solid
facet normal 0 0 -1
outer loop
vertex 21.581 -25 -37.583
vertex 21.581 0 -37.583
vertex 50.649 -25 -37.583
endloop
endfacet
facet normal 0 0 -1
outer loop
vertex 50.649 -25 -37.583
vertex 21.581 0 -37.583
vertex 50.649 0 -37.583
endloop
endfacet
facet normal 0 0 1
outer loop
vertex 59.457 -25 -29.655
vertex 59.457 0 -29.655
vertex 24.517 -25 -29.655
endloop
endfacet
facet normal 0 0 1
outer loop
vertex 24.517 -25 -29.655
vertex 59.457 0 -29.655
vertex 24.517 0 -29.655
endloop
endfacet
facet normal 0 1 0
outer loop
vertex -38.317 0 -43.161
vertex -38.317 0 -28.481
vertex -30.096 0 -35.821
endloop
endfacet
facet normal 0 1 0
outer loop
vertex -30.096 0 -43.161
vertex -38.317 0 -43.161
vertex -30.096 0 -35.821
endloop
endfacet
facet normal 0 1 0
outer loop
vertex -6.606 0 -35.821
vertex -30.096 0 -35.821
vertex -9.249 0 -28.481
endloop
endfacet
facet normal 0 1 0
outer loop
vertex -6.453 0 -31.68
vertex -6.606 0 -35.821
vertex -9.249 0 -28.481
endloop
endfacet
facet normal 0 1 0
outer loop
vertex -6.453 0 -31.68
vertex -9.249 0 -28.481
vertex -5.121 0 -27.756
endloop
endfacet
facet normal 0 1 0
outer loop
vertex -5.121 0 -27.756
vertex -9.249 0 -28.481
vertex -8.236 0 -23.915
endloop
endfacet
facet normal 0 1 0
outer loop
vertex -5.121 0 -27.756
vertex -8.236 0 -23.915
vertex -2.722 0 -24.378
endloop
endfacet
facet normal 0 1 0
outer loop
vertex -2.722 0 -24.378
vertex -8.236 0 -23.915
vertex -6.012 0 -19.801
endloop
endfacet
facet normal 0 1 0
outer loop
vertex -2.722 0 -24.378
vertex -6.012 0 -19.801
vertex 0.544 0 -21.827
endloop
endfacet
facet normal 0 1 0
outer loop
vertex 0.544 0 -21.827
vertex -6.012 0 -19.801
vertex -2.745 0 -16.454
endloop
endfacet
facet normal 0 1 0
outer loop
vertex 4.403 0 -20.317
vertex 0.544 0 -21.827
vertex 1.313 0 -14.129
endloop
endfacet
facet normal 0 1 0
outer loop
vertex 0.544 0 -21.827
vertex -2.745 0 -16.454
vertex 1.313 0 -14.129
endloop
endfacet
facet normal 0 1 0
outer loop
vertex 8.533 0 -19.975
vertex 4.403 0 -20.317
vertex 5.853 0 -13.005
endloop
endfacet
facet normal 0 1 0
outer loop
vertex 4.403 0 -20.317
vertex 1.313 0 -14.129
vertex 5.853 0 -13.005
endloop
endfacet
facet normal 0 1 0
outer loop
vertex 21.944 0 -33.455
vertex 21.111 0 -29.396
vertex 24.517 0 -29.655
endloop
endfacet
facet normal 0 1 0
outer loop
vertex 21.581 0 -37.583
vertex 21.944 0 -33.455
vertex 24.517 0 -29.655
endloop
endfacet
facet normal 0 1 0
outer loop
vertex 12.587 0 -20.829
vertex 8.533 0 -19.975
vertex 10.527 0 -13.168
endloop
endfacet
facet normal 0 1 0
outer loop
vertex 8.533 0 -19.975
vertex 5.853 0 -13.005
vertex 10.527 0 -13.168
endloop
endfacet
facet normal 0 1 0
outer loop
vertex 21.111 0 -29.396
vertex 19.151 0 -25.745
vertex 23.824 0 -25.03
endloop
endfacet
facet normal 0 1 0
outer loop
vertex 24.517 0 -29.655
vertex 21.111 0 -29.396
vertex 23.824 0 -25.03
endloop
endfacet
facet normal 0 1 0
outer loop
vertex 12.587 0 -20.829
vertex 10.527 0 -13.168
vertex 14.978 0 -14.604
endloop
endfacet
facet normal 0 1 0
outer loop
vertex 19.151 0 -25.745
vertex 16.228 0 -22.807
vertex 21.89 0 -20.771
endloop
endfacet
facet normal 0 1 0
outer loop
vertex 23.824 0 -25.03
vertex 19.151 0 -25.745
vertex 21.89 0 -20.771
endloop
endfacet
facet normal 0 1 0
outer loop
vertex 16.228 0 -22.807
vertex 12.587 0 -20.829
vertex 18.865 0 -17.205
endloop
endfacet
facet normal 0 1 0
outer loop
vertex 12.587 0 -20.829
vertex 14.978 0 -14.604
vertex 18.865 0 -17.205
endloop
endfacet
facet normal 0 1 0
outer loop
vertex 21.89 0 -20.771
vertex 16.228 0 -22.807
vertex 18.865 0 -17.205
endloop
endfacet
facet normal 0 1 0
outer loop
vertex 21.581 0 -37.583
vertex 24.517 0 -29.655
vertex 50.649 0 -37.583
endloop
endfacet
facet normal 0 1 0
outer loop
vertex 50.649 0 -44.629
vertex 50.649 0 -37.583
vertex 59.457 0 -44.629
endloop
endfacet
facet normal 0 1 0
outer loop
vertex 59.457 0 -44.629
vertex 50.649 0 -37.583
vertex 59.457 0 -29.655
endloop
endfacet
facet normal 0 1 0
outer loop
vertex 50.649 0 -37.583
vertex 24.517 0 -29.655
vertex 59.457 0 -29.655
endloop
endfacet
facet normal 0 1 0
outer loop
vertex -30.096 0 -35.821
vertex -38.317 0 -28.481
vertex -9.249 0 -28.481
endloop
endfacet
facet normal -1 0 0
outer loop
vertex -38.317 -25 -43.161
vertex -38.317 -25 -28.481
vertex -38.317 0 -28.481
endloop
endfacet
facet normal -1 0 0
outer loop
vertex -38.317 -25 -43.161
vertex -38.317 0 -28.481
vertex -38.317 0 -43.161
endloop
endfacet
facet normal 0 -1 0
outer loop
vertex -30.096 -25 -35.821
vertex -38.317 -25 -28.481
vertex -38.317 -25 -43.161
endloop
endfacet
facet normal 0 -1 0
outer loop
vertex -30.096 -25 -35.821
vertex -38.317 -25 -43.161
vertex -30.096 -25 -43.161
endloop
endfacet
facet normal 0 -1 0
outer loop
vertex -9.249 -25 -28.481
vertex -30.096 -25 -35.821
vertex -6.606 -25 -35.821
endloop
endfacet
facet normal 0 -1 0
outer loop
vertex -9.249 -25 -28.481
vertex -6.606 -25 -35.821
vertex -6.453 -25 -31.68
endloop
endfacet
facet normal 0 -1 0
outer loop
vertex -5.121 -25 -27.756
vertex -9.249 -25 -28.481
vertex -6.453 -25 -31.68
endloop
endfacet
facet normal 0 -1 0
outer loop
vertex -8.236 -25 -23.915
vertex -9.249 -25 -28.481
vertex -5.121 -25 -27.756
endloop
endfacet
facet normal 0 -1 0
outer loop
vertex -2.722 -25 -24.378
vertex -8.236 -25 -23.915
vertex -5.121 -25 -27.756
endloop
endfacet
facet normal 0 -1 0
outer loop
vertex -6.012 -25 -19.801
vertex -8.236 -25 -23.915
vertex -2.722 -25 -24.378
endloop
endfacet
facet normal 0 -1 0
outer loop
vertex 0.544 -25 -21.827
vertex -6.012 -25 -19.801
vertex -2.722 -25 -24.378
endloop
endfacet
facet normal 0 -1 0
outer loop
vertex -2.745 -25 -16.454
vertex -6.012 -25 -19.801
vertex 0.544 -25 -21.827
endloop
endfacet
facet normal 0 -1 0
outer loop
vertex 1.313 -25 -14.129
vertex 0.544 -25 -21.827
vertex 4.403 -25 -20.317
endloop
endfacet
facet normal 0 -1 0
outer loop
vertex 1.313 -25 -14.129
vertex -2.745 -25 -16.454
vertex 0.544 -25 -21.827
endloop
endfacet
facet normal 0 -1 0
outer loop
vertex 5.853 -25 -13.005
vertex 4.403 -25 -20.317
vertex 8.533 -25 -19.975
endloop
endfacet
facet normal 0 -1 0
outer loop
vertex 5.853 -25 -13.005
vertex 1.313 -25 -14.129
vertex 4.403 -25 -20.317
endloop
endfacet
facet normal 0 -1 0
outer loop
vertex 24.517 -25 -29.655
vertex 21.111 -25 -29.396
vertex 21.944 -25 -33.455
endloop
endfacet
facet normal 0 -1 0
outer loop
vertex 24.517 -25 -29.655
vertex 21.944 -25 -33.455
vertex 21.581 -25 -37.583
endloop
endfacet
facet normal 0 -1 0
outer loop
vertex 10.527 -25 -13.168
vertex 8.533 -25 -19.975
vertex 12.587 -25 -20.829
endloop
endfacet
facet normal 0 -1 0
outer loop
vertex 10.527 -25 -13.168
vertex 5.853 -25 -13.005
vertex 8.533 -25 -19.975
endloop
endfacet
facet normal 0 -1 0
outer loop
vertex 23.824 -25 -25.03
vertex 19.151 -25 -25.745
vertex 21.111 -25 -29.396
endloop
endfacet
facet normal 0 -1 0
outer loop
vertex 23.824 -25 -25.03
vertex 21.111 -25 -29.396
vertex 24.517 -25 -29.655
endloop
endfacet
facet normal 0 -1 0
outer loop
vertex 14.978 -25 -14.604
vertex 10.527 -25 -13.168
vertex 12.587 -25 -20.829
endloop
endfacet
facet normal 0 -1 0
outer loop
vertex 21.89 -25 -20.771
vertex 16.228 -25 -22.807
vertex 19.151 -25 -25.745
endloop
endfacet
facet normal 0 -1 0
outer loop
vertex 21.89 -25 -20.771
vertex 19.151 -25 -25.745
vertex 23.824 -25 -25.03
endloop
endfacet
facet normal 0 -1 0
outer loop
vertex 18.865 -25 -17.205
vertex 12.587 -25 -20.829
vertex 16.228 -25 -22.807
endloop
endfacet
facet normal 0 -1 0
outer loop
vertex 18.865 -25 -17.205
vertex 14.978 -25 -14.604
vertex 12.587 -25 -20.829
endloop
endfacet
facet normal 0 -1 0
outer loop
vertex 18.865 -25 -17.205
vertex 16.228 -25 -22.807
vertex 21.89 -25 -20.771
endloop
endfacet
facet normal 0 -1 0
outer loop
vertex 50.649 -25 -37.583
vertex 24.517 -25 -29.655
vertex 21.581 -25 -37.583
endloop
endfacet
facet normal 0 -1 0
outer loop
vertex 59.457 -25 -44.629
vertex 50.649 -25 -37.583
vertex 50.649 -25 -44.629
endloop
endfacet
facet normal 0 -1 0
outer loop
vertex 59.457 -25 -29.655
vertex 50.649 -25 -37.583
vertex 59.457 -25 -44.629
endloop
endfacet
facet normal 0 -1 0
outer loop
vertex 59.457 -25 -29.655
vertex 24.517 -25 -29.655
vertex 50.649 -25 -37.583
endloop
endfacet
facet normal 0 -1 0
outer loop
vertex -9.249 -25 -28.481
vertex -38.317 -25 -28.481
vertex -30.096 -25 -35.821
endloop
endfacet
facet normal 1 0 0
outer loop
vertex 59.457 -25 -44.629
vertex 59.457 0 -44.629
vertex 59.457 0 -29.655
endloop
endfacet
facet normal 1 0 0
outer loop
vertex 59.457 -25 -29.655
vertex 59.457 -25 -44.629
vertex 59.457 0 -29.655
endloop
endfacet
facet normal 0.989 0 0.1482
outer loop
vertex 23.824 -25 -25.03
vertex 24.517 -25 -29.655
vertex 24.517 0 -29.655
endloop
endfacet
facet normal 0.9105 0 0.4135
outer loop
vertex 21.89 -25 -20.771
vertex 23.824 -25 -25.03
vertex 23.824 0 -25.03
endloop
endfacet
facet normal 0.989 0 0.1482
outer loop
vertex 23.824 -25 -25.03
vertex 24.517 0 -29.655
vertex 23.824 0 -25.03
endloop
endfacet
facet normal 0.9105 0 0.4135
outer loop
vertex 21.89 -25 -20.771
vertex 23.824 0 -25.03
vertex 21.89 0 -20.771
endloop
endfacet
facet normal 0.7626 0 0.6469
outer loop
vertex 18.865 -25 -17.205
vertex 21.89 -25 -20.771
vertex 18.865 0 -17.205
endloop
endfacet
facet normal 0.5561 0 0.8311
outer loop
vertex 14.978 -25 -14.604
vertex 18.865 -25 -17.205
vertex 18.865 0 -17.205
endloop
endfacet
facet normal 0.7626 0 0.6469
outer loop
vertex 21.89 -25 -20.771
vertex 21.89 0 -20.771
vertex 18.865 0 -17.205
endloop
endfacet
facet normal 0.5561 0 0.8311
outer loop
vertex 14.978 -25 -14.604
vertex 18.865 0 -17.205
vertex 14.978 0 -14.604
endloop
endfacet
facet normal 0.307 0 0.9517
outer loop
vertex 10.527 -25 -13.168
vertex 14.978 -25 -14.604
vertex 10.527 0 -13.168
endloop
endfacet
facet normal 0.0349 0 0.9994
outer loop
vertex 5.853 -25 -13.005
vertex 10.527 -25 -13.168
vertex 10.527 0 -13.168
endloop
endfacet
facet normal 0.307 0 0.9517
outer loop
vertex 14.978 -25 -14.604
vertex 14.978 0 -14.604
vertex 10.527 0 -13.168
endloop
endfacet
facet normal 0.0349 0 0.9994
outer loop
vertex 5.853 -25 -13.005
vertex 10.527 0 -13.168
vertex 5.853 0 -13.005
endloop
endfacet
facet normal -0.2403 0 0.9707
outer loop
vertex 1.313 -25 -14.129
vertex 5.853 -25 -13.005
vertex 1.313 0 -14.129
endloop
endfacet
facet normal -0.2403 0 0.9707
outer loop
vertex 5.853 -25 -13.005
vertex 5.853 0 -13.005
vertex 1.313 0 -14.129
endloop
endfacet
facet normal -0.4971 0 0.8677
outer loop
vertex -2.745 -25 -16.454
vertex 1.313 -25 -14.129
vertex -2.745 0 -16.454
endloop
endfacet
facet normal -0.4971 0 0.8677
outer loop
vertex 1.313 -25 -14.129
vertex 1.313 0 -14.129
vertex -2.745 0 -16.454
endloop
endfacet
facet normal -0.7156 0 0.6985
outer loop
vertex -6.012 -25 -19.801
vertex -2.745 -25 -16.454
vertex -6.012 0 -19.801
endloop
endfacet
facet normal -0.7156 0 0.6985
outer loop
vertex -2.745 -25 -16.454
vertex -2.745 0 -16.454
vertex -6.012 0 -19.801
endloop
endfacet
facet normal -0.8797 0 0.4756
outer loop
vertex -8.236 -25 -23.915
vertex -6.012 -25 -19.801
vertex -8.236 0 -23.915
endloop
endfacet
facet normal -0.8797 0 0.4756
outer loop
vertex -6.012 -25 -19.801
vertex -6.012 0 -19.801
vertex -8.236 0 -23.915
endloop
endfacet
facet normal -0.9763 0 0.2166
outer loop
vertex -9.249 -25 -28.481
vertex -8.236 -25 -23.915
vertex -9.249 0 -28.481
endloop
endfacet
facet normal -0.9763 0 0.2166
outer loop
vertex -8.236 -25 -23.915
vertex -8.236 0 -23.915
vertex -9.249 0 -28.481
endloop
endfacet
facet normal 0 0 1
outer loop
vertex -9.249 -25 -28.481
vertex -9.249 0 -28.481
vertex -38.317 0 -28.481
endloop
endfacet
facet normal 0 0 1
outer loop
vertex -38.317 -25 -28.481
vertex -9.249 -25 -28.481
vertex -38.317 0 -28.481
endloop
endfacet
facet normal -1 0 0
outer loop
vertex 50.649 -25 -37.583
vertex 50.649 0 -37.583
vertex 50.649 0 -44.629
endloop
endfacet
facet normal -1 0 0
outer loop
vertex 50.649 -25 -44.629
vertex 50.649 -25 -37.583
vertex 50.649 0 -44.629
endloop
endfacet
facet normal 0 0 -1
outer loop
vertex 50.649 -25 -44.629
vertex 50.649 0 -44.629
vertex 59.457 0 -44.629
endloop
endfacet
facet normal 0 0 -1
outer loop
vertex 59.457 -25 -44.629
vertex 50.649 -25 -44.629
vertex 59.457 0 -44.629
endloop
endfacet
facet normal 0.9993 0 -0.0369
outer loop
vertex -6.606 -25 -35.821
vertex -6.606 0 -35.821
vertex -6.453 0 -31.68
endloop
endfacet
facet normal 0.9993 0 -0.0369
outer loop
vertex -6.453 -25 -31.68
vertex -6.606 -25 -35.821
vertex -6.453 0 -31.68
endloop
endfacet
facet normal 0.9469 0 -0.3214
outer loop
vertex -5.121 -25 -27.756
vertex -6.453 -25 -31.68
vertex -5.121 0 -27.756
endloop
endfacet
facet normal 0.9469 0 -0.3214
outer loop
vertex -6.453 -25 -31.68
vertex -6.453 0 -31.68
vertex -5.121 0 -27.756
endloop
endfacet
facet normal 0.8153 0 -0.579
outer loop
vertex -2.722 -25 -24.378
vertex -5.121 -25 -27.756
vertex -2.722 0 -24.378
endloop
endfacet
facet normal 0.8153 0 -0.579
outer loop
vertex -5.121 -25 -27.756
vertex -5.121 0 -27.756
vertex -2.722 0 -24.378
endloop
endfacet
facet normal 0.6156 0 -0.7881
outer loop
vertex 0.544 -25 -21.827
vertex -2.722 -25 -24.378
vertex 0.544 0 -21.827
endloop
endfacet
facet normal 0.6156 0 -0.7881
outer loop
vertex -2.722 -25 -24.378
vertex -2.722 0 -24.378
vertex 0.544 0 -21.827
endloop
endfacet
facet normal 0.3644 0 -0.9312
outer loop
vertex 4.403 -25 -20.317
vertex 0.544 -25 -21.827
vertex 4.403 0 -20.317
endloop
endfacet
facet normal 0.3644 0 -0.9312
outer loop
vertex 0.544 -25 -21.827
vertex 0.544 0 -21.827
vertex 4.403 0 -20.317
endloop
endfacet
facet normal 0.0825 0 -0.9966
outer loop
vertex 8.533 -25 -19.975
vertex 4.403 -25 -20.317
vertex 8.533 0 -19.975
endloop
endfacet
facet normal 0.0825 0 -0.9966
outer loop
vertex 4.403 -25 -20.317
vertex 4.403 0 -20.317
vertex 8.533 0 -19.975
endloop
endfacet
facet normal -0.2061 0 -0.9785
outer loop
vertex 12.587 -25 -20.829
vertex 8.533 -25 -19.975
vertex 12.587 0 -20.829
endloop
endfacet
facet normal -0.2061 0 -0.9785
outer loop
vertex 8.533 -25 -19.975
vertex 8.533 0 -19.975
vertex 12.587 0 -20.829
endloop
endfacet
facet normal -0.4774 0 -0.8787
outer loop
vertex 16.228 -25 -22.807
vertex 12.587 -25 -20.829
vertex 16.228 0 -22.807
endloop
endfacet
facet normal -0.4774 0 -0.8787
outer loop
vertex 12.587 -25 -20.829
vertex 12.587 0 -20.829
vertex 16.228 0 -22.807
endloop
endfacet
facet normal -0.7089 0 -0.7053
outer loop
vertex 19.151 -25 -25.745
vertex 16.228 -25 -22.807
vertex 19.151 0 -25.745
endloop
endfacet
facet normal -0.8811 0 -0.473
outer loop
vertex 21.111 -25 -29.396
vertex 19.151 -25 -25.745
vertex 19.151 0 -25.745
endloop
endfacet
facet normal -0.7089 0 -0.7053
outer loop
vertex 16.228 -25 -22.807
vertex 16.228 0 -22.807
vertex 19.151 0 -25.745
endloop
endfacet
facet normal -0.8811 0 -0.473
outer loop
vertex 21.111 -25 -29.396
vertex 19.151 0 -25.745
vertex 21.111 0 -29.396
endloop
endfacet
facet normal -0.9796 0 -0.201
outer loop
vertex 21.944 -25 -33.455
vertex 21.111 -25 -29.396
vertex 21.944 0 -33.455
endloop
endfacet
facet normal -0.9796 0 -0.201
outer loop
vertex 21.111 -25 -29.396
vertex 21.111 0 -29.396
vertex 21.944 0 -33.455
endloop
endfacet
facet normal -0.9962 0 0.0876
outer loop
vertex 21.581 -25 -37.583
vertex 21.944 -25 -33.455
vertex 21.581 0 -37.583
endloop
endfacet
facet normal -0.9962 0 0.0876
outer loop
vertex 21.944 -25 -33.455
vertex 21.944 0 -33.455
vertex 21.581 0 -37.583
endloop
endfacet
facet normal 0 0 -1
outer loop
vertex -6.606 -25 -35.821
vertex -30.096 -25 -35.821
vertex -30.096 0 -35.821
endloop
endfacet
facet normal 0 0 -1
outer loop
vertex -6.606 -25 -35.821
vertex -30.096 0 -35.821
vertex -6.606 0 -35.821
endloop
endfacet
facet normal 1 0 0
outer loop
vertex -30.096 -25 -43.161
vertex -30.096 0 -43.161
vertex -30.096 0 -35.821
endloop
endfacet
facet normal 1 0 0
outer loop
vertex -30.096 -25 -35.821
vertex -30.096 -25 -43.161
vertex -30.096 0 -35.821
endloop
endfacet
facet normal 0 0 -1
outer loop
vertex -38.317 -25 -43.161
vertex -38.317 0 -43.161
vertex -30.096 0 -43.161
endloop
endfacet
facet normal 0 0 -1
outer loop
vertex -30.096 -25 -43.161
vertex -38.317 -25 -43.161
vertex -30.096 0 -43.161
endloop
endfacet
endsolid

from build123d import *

# Parameters (mm, degrees)
F1_DEPTH = 25


with BuildPart() as f1:
    # F0 (on Front) → F1 (new body)
    with BuildSketch(Plane.XZ):
        with BuildLine():
            Line((50.648533, -37.582681), (50.648533, -44.629429))
            Line((50.648533, -44.629429), (59.456974, -44.629429))
            Line((59.456974, -44.629429), (59.456974, -29.655084))
            Line((59.456974, -29.655084), (24.516825, -29.655084))
            ThreePointArc((24.516825, -29.655084), (8.195501, -12.924194), (-9.248863, -28.480623))
            Line((-9.248863, -28.480623), (-38.316716, -28.480623))
            Line((-38.316716, -28.480623), (-38.316716, -43.161355))
            Line((-38.316716, -43.161355), (-30.095505, -43.161355))
            Line((-30.095505, -43.161355), (-30.095505, -35.820991))
            Line((-30.095505, -35.820991), (-6.60633, -35.820991))
            ThreePointArc((-6.60633, -35.820991), (8.532595, -19.975134), (21.580679, -37.582681))
            Line((21.580679, -37.582681), (50.648533, -37.582681))
        make_face()
    extrude(amount=F1_DEPTH)


solid = f1.part
